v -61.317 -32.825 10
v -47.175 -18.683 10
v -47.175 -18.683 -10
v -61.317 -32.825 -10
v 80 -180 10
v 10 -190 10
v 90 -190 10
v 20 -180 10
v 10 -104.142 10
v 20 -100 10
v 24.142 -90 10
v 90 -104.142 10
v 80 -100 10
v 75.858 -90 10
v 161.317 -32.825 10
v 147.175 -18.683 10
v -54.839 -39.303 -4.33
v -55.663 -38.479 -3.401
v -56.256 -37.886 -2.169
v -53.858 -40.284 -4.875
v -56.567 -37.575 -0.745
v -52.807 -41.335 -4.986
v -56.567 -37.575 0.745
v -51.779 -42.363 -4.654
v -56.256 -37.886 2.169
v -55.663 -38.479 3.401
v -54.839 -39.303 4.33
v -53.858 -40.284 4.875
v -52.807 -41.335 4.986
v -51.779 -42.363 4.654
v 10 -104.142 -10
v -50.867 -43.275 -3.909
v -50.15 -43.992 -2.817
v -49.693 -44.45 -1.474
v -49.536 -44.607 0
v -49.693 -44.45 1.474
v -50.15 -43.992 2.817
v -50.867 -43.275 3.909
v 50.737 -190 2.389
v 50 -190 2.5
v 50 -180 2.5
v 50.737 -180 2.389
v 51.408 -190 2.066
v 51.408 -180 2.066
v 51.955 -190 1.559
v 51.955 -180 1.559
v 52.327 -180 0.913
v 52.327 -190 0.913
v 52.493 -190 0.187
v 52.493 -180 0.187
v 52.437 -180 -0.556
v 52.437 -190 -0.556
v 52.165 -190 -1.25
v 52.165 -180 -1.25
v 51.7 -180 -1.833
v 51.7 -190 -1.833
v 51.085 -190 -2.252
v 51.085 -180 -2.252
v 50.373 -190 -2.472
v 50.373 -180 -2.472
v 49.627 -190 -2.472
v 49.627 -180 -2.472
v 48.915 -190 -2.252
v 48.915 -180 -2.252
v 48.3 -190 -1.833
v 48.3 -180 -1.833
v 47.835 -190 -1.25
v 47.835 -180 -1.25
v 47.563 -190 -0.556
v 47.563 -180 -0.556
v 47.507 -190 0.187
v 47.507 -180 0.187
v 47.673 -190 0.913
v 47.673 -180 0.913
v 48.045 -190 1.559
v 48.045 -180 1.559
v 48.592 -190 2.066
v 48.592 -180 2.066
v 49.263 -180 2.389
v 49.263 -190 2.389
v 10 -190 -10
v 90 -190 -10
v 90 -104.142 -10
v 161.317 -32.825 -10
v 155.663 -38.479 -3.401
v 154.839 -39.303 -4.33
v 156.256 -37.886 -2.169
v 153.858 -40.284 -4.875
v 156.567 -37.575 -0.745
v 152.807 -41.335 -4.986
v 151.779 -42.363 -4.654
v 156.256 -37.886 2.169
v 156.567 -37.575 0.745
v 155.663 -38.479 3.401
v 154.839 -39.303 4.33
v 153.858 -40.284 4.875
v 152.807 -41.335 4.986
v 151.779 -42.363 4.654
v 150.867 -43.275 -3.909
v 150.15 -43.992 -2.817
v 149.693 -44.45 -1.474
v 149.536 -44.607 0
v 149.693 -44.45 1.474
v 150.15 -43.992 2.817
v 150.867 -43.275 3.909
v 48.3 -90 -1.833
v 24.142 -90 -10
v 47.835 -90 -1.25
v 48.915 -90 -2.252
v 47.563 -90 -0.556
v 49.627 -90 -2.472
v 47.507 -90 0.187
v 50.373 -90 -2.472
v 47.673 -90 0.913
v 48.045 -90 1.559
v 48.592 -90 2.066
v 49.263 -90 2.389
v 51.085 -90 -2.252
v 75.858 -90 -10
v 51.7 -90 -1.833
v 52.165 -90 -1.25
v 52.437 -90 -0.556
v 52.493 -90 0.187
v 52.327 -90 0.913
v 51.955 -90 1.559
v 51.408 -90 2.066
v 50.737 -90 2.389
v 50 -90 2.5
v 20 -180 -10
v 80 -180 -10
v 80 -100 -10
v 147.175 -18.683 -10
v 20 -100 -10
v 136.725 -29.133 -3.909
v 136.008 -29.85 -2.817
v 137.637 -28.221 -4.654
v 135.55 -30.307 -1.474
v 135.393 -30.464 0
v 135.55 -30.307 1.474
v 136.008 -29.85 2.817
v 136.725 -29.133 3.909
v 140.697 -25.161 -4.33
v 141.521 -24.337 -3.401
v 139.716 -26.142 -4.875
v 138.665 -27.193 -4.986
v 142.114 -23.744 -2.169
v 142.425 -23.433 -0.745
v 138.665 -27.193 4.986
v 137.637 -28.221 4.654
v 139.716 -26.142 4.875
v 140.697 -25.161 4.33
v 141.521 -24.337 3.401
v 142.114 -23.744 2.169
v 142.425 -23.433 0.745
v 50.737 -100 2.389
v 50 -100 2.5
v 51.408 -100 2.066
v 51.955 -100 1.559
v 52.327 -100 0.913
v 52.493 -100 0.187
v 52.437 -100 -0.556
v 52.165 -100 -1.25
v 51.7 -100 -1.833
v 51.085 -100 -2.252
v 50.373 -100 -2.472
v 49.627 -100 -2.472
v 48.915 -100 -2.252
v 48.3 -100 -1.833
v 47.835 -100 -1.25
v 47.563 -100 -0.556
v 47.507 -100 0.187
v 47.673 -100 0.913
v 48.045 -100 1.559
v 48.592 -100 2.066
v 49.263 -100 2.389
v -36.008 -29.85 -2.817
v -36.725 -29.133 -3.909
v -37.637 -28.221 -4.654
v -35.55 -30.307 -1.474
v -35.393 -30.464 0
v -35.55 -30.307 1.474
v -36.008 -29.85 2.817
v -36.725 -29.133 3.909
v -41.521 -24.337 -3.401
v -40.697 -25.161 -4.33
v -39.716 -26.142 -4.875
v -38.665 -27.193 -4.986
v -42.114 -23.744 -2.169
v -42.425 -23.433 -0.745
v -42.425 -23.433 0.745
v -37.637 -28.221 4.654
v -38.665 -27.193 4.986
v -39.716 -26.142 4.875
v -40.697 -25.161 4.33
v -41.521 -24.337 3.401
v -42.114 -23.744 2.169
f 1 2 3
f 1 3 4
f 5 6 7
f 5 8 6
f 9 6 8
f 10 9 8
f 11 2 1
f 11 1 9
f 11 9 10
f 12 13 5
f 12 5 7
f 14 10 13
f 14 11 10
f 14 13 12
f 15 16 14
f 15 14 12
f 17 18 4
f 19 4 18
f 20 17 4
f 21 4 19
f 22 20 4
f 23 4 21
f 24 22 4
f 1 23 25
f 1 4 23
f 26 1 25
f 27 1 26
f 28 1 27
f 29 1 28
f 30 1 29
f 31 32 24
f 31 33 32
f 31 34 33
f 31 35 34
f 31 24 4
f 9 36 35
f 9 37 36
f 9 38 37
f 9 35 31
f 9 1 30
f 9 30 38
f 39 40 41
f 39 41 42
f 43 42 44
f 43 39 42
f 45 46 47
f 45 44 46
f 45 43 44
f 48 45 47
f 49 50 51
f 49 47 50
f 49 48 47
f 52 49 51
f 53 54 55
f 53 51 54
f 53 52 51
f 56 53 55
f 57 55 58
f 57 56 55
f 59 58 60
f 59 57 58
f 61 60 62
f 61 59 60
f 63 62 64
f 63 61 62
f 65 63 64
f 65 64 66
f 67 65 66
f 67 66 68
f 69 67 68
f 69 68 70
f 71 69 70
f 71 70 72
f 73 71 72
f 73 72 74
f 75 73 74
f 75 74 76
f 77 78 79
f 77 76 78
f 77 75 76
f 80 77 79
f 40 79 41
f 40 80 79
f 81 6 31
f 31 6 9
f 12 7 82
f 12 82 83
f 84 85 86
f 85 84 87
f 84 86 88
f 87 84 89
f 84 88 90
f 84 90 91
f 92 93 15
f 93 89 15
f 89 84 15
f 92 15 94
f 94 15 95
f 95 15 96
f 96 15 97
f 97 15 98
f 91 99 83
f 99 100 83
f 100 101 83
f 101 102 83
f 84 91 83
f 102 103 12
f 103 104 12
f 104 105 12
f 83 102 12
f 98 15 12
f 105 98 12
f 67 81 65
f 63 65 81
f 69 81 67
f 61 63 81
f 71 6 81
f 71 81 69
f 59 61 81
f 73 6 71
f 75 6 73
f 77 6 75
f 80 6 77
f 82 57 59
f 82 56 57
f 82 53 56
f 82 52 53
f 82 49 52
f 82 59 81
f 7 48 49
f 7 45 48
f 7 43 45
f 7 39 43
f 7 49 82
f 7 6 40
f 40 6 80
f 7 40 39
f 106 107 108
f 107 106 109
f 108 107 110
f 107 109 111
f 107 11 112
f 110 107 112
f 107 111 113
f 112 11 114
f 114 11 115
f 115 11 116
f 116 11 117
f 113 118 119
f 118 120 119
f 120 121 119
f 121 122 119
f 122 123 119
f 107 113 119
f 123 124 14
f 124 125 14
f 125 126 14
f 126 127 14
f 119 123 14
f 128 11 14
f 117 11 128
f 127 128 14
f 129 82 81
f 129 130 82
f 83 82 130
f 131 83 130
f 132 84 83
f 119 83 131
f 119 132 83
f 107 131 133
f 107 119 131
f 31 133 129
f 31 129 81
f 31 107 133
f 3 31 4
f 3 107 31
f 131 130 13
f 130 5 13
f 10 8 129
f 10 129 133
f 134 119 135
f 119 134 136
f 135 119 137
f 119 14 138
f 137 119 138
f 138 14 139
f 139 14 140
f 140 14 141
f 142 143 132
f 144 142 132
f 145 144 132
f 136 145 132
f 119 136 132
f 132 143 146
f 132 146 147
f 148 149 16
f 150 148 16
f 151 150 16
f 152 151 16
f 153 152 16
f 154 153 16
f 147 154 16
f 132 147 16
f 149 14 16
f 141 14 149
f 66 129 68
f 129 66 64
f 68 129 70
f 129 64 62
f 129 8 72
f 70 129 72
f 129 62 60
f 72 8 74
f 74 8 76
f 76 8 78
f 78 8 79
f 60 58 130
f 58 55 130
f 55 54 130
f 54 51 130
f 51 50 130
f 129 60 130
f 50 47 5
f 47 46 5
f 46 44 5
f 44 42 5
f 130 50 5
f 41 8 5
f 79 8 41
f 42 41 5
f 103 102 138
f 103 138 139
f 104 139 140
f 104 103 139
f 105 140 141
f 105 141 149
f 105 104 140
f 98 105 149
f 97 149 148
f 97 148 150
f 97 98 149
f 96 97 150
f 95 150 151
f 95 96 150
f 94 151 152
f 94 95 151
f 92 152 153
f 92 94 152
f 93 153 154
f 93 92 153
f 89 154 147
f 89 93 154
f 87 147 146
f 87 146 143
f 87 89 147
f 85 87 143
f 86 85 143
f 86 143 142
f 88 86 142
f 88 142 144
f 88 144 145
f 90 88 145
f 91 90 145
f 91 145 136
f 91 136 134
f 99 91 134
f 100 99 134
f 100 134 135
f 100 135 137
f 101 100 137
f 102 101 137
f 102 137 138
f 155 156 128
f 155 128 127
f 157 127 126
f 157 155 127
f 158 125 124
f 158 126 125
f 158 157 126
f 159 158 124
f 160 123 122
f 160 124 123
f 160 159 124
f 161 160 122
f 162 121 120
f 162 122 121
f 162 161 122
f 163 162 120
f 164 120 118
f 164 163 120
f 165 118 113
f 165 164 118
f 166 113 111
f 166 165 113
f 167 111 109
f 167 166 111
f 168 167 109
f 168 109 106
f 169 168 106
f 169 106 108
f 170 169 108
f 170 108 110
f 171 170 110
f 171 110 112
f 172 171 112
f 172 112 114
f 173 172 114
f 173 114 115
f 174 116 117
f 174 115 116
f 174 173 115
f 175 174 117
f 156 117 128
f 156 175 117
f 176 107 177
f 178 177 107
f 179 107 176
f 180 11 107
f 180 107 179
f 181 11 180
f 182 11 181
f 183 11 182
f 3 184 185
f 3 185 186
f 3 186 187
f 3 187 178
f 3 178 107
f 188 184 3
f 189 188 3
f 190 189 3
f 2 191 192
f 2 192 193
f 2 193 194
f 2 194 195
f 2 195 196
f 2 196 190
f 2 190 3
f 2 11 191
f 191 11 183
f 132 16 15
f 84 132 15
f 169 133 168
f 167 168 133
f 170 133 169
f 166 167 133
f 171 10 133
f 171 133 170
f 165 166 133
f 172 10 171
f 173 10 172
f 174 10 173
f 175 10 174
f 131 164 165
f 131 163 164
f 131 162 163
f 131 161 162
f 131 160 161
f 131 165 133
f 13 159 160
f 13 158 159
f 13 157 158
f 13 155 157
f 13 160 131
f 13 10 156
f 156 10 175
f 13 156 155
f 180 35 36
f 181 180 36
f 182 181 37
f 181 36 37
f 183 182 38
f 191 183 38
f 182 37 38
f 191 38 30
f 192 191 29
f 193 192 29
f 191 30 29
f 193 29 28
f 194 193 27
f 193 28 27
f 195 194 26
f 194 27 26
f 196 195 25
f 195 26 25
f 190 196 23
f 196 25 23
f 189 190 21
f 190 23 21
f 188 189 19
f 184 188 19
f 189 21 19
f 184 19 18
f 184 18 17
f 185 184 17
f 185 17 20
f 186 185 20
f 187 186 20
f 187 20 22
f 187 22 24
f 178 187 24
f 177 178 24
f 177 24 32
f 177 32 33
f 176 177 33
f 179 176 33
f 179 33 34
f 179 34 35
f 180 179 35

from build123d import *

# Parameters (mm, degrees)
SKETCH1_W               = 80
SKETCH1_H               = 100
SKETCH1_W_2             = 60
SKETCH1_H_2             = 80
EXTRUDE_THIN1_DEPTH     = 10
BOSS_EXTRUDE1_DEPTH     = 10
CUT_EXTRUDE1_REACH      = 200.286
SKETCH3_R               = 5
CUT_EXTRUDE2_DEPTH      = 191.061213228
CUT_EXTRUDE2_DEPTH_BACK = 191.061213228
SKETCH4_R               = 2.5


with BuildPart() as part:
    # Sketch1 → Extrude-Thin1 (new, symmetric)
    with BuildSketch(Plane.XY):
        with Locations((50, -140)):
            Rectangle(SKETCH1_W, SKETCH1_H)
        with Locations((50, -140)):
            Rectangle(SKETCH1_W_2, SKETCH1_H_2, mode=Mode.SUBTRACT)
    extrude(amount=EXTRUDE_THIN1_DEPTH, both=True)

    # Sketch2 → Boss-Extrude1 (add, symmetric)
    with BuildSketch(Plane.XY):
        Polygon((27.071067812, -92.928932188), (-47.175144213, -18.682720164), (-61.317279836, -32.824855787), (12.928932188, -107.071067812), align=None)
    boss_extrude1 = extrude(amount=BOSS_EXTRUDE1_DEPTH, both=True)

    # Sketch3 → Cut-Extrude1 (cut, up to next)
    with BuildSketch(Plane(origin=(-47.071067812, -47.071067812, 0), x_dir=(0, 0, 1), z_dir=(-0.7071067811865477, -0.7071067811865475, 0)), mode=Mode.PRIVATE) as cut_extrude1_sk1:
        with Locations(Location((0, 8.485281374, 0), (0, 0, 270))):
            Circle(SKETCH3_R)
    cut_extrude1_tool1 = extrude(cut_extrude1_sk1.sketch, amount=-CUT_EXTRUDE1_REACH, mode=Mode.PRIVATE) & part.part
    cut_extrude1 = cut_extrude1_tool1.solids().sort_by_distance((-53.071068, -41.071068, 0))[0]
    add(cut_extrude1, mode=Mode.SUBTRACT)

    # Mirror1: Boss-Extrude1, Cut-Extrude1 across plane
    add(boss_extrude1.mirror(Plane(origin=(50, 0, 0), x_dir=(0, 0, 1), z_dir=(1, 0, 0))))
    add(cut_extrude1.mirror(Plane(origin=(50, 0, 0), x_dir=(0, 0, 1), z_dir=(1, 0, 0))), mode=Mode.SUBTRACT)

    # Sketch4 → Cut-Extrude2 (cut, two sides: drawn at the far end of the back side and taken through both)
    with BuildSketch(Plane(origin=(0, -90, 0), x_dir=(1, 0, 0), z_dir=(0, 1, 0)).offset(-CUT_EXTRUDE2_DEPTH_BACK)):
        with Locations(Location((50, 0, 0), (0, 0, 270))):
            Circle(SKETCH4_R)
    extrude(amount=CUT_EXTRUDE2_DEPTH + CUT_EXTRUDE2_DEPTH_BACK, mode=Mode.SUBTRACT)


solid = part.part
